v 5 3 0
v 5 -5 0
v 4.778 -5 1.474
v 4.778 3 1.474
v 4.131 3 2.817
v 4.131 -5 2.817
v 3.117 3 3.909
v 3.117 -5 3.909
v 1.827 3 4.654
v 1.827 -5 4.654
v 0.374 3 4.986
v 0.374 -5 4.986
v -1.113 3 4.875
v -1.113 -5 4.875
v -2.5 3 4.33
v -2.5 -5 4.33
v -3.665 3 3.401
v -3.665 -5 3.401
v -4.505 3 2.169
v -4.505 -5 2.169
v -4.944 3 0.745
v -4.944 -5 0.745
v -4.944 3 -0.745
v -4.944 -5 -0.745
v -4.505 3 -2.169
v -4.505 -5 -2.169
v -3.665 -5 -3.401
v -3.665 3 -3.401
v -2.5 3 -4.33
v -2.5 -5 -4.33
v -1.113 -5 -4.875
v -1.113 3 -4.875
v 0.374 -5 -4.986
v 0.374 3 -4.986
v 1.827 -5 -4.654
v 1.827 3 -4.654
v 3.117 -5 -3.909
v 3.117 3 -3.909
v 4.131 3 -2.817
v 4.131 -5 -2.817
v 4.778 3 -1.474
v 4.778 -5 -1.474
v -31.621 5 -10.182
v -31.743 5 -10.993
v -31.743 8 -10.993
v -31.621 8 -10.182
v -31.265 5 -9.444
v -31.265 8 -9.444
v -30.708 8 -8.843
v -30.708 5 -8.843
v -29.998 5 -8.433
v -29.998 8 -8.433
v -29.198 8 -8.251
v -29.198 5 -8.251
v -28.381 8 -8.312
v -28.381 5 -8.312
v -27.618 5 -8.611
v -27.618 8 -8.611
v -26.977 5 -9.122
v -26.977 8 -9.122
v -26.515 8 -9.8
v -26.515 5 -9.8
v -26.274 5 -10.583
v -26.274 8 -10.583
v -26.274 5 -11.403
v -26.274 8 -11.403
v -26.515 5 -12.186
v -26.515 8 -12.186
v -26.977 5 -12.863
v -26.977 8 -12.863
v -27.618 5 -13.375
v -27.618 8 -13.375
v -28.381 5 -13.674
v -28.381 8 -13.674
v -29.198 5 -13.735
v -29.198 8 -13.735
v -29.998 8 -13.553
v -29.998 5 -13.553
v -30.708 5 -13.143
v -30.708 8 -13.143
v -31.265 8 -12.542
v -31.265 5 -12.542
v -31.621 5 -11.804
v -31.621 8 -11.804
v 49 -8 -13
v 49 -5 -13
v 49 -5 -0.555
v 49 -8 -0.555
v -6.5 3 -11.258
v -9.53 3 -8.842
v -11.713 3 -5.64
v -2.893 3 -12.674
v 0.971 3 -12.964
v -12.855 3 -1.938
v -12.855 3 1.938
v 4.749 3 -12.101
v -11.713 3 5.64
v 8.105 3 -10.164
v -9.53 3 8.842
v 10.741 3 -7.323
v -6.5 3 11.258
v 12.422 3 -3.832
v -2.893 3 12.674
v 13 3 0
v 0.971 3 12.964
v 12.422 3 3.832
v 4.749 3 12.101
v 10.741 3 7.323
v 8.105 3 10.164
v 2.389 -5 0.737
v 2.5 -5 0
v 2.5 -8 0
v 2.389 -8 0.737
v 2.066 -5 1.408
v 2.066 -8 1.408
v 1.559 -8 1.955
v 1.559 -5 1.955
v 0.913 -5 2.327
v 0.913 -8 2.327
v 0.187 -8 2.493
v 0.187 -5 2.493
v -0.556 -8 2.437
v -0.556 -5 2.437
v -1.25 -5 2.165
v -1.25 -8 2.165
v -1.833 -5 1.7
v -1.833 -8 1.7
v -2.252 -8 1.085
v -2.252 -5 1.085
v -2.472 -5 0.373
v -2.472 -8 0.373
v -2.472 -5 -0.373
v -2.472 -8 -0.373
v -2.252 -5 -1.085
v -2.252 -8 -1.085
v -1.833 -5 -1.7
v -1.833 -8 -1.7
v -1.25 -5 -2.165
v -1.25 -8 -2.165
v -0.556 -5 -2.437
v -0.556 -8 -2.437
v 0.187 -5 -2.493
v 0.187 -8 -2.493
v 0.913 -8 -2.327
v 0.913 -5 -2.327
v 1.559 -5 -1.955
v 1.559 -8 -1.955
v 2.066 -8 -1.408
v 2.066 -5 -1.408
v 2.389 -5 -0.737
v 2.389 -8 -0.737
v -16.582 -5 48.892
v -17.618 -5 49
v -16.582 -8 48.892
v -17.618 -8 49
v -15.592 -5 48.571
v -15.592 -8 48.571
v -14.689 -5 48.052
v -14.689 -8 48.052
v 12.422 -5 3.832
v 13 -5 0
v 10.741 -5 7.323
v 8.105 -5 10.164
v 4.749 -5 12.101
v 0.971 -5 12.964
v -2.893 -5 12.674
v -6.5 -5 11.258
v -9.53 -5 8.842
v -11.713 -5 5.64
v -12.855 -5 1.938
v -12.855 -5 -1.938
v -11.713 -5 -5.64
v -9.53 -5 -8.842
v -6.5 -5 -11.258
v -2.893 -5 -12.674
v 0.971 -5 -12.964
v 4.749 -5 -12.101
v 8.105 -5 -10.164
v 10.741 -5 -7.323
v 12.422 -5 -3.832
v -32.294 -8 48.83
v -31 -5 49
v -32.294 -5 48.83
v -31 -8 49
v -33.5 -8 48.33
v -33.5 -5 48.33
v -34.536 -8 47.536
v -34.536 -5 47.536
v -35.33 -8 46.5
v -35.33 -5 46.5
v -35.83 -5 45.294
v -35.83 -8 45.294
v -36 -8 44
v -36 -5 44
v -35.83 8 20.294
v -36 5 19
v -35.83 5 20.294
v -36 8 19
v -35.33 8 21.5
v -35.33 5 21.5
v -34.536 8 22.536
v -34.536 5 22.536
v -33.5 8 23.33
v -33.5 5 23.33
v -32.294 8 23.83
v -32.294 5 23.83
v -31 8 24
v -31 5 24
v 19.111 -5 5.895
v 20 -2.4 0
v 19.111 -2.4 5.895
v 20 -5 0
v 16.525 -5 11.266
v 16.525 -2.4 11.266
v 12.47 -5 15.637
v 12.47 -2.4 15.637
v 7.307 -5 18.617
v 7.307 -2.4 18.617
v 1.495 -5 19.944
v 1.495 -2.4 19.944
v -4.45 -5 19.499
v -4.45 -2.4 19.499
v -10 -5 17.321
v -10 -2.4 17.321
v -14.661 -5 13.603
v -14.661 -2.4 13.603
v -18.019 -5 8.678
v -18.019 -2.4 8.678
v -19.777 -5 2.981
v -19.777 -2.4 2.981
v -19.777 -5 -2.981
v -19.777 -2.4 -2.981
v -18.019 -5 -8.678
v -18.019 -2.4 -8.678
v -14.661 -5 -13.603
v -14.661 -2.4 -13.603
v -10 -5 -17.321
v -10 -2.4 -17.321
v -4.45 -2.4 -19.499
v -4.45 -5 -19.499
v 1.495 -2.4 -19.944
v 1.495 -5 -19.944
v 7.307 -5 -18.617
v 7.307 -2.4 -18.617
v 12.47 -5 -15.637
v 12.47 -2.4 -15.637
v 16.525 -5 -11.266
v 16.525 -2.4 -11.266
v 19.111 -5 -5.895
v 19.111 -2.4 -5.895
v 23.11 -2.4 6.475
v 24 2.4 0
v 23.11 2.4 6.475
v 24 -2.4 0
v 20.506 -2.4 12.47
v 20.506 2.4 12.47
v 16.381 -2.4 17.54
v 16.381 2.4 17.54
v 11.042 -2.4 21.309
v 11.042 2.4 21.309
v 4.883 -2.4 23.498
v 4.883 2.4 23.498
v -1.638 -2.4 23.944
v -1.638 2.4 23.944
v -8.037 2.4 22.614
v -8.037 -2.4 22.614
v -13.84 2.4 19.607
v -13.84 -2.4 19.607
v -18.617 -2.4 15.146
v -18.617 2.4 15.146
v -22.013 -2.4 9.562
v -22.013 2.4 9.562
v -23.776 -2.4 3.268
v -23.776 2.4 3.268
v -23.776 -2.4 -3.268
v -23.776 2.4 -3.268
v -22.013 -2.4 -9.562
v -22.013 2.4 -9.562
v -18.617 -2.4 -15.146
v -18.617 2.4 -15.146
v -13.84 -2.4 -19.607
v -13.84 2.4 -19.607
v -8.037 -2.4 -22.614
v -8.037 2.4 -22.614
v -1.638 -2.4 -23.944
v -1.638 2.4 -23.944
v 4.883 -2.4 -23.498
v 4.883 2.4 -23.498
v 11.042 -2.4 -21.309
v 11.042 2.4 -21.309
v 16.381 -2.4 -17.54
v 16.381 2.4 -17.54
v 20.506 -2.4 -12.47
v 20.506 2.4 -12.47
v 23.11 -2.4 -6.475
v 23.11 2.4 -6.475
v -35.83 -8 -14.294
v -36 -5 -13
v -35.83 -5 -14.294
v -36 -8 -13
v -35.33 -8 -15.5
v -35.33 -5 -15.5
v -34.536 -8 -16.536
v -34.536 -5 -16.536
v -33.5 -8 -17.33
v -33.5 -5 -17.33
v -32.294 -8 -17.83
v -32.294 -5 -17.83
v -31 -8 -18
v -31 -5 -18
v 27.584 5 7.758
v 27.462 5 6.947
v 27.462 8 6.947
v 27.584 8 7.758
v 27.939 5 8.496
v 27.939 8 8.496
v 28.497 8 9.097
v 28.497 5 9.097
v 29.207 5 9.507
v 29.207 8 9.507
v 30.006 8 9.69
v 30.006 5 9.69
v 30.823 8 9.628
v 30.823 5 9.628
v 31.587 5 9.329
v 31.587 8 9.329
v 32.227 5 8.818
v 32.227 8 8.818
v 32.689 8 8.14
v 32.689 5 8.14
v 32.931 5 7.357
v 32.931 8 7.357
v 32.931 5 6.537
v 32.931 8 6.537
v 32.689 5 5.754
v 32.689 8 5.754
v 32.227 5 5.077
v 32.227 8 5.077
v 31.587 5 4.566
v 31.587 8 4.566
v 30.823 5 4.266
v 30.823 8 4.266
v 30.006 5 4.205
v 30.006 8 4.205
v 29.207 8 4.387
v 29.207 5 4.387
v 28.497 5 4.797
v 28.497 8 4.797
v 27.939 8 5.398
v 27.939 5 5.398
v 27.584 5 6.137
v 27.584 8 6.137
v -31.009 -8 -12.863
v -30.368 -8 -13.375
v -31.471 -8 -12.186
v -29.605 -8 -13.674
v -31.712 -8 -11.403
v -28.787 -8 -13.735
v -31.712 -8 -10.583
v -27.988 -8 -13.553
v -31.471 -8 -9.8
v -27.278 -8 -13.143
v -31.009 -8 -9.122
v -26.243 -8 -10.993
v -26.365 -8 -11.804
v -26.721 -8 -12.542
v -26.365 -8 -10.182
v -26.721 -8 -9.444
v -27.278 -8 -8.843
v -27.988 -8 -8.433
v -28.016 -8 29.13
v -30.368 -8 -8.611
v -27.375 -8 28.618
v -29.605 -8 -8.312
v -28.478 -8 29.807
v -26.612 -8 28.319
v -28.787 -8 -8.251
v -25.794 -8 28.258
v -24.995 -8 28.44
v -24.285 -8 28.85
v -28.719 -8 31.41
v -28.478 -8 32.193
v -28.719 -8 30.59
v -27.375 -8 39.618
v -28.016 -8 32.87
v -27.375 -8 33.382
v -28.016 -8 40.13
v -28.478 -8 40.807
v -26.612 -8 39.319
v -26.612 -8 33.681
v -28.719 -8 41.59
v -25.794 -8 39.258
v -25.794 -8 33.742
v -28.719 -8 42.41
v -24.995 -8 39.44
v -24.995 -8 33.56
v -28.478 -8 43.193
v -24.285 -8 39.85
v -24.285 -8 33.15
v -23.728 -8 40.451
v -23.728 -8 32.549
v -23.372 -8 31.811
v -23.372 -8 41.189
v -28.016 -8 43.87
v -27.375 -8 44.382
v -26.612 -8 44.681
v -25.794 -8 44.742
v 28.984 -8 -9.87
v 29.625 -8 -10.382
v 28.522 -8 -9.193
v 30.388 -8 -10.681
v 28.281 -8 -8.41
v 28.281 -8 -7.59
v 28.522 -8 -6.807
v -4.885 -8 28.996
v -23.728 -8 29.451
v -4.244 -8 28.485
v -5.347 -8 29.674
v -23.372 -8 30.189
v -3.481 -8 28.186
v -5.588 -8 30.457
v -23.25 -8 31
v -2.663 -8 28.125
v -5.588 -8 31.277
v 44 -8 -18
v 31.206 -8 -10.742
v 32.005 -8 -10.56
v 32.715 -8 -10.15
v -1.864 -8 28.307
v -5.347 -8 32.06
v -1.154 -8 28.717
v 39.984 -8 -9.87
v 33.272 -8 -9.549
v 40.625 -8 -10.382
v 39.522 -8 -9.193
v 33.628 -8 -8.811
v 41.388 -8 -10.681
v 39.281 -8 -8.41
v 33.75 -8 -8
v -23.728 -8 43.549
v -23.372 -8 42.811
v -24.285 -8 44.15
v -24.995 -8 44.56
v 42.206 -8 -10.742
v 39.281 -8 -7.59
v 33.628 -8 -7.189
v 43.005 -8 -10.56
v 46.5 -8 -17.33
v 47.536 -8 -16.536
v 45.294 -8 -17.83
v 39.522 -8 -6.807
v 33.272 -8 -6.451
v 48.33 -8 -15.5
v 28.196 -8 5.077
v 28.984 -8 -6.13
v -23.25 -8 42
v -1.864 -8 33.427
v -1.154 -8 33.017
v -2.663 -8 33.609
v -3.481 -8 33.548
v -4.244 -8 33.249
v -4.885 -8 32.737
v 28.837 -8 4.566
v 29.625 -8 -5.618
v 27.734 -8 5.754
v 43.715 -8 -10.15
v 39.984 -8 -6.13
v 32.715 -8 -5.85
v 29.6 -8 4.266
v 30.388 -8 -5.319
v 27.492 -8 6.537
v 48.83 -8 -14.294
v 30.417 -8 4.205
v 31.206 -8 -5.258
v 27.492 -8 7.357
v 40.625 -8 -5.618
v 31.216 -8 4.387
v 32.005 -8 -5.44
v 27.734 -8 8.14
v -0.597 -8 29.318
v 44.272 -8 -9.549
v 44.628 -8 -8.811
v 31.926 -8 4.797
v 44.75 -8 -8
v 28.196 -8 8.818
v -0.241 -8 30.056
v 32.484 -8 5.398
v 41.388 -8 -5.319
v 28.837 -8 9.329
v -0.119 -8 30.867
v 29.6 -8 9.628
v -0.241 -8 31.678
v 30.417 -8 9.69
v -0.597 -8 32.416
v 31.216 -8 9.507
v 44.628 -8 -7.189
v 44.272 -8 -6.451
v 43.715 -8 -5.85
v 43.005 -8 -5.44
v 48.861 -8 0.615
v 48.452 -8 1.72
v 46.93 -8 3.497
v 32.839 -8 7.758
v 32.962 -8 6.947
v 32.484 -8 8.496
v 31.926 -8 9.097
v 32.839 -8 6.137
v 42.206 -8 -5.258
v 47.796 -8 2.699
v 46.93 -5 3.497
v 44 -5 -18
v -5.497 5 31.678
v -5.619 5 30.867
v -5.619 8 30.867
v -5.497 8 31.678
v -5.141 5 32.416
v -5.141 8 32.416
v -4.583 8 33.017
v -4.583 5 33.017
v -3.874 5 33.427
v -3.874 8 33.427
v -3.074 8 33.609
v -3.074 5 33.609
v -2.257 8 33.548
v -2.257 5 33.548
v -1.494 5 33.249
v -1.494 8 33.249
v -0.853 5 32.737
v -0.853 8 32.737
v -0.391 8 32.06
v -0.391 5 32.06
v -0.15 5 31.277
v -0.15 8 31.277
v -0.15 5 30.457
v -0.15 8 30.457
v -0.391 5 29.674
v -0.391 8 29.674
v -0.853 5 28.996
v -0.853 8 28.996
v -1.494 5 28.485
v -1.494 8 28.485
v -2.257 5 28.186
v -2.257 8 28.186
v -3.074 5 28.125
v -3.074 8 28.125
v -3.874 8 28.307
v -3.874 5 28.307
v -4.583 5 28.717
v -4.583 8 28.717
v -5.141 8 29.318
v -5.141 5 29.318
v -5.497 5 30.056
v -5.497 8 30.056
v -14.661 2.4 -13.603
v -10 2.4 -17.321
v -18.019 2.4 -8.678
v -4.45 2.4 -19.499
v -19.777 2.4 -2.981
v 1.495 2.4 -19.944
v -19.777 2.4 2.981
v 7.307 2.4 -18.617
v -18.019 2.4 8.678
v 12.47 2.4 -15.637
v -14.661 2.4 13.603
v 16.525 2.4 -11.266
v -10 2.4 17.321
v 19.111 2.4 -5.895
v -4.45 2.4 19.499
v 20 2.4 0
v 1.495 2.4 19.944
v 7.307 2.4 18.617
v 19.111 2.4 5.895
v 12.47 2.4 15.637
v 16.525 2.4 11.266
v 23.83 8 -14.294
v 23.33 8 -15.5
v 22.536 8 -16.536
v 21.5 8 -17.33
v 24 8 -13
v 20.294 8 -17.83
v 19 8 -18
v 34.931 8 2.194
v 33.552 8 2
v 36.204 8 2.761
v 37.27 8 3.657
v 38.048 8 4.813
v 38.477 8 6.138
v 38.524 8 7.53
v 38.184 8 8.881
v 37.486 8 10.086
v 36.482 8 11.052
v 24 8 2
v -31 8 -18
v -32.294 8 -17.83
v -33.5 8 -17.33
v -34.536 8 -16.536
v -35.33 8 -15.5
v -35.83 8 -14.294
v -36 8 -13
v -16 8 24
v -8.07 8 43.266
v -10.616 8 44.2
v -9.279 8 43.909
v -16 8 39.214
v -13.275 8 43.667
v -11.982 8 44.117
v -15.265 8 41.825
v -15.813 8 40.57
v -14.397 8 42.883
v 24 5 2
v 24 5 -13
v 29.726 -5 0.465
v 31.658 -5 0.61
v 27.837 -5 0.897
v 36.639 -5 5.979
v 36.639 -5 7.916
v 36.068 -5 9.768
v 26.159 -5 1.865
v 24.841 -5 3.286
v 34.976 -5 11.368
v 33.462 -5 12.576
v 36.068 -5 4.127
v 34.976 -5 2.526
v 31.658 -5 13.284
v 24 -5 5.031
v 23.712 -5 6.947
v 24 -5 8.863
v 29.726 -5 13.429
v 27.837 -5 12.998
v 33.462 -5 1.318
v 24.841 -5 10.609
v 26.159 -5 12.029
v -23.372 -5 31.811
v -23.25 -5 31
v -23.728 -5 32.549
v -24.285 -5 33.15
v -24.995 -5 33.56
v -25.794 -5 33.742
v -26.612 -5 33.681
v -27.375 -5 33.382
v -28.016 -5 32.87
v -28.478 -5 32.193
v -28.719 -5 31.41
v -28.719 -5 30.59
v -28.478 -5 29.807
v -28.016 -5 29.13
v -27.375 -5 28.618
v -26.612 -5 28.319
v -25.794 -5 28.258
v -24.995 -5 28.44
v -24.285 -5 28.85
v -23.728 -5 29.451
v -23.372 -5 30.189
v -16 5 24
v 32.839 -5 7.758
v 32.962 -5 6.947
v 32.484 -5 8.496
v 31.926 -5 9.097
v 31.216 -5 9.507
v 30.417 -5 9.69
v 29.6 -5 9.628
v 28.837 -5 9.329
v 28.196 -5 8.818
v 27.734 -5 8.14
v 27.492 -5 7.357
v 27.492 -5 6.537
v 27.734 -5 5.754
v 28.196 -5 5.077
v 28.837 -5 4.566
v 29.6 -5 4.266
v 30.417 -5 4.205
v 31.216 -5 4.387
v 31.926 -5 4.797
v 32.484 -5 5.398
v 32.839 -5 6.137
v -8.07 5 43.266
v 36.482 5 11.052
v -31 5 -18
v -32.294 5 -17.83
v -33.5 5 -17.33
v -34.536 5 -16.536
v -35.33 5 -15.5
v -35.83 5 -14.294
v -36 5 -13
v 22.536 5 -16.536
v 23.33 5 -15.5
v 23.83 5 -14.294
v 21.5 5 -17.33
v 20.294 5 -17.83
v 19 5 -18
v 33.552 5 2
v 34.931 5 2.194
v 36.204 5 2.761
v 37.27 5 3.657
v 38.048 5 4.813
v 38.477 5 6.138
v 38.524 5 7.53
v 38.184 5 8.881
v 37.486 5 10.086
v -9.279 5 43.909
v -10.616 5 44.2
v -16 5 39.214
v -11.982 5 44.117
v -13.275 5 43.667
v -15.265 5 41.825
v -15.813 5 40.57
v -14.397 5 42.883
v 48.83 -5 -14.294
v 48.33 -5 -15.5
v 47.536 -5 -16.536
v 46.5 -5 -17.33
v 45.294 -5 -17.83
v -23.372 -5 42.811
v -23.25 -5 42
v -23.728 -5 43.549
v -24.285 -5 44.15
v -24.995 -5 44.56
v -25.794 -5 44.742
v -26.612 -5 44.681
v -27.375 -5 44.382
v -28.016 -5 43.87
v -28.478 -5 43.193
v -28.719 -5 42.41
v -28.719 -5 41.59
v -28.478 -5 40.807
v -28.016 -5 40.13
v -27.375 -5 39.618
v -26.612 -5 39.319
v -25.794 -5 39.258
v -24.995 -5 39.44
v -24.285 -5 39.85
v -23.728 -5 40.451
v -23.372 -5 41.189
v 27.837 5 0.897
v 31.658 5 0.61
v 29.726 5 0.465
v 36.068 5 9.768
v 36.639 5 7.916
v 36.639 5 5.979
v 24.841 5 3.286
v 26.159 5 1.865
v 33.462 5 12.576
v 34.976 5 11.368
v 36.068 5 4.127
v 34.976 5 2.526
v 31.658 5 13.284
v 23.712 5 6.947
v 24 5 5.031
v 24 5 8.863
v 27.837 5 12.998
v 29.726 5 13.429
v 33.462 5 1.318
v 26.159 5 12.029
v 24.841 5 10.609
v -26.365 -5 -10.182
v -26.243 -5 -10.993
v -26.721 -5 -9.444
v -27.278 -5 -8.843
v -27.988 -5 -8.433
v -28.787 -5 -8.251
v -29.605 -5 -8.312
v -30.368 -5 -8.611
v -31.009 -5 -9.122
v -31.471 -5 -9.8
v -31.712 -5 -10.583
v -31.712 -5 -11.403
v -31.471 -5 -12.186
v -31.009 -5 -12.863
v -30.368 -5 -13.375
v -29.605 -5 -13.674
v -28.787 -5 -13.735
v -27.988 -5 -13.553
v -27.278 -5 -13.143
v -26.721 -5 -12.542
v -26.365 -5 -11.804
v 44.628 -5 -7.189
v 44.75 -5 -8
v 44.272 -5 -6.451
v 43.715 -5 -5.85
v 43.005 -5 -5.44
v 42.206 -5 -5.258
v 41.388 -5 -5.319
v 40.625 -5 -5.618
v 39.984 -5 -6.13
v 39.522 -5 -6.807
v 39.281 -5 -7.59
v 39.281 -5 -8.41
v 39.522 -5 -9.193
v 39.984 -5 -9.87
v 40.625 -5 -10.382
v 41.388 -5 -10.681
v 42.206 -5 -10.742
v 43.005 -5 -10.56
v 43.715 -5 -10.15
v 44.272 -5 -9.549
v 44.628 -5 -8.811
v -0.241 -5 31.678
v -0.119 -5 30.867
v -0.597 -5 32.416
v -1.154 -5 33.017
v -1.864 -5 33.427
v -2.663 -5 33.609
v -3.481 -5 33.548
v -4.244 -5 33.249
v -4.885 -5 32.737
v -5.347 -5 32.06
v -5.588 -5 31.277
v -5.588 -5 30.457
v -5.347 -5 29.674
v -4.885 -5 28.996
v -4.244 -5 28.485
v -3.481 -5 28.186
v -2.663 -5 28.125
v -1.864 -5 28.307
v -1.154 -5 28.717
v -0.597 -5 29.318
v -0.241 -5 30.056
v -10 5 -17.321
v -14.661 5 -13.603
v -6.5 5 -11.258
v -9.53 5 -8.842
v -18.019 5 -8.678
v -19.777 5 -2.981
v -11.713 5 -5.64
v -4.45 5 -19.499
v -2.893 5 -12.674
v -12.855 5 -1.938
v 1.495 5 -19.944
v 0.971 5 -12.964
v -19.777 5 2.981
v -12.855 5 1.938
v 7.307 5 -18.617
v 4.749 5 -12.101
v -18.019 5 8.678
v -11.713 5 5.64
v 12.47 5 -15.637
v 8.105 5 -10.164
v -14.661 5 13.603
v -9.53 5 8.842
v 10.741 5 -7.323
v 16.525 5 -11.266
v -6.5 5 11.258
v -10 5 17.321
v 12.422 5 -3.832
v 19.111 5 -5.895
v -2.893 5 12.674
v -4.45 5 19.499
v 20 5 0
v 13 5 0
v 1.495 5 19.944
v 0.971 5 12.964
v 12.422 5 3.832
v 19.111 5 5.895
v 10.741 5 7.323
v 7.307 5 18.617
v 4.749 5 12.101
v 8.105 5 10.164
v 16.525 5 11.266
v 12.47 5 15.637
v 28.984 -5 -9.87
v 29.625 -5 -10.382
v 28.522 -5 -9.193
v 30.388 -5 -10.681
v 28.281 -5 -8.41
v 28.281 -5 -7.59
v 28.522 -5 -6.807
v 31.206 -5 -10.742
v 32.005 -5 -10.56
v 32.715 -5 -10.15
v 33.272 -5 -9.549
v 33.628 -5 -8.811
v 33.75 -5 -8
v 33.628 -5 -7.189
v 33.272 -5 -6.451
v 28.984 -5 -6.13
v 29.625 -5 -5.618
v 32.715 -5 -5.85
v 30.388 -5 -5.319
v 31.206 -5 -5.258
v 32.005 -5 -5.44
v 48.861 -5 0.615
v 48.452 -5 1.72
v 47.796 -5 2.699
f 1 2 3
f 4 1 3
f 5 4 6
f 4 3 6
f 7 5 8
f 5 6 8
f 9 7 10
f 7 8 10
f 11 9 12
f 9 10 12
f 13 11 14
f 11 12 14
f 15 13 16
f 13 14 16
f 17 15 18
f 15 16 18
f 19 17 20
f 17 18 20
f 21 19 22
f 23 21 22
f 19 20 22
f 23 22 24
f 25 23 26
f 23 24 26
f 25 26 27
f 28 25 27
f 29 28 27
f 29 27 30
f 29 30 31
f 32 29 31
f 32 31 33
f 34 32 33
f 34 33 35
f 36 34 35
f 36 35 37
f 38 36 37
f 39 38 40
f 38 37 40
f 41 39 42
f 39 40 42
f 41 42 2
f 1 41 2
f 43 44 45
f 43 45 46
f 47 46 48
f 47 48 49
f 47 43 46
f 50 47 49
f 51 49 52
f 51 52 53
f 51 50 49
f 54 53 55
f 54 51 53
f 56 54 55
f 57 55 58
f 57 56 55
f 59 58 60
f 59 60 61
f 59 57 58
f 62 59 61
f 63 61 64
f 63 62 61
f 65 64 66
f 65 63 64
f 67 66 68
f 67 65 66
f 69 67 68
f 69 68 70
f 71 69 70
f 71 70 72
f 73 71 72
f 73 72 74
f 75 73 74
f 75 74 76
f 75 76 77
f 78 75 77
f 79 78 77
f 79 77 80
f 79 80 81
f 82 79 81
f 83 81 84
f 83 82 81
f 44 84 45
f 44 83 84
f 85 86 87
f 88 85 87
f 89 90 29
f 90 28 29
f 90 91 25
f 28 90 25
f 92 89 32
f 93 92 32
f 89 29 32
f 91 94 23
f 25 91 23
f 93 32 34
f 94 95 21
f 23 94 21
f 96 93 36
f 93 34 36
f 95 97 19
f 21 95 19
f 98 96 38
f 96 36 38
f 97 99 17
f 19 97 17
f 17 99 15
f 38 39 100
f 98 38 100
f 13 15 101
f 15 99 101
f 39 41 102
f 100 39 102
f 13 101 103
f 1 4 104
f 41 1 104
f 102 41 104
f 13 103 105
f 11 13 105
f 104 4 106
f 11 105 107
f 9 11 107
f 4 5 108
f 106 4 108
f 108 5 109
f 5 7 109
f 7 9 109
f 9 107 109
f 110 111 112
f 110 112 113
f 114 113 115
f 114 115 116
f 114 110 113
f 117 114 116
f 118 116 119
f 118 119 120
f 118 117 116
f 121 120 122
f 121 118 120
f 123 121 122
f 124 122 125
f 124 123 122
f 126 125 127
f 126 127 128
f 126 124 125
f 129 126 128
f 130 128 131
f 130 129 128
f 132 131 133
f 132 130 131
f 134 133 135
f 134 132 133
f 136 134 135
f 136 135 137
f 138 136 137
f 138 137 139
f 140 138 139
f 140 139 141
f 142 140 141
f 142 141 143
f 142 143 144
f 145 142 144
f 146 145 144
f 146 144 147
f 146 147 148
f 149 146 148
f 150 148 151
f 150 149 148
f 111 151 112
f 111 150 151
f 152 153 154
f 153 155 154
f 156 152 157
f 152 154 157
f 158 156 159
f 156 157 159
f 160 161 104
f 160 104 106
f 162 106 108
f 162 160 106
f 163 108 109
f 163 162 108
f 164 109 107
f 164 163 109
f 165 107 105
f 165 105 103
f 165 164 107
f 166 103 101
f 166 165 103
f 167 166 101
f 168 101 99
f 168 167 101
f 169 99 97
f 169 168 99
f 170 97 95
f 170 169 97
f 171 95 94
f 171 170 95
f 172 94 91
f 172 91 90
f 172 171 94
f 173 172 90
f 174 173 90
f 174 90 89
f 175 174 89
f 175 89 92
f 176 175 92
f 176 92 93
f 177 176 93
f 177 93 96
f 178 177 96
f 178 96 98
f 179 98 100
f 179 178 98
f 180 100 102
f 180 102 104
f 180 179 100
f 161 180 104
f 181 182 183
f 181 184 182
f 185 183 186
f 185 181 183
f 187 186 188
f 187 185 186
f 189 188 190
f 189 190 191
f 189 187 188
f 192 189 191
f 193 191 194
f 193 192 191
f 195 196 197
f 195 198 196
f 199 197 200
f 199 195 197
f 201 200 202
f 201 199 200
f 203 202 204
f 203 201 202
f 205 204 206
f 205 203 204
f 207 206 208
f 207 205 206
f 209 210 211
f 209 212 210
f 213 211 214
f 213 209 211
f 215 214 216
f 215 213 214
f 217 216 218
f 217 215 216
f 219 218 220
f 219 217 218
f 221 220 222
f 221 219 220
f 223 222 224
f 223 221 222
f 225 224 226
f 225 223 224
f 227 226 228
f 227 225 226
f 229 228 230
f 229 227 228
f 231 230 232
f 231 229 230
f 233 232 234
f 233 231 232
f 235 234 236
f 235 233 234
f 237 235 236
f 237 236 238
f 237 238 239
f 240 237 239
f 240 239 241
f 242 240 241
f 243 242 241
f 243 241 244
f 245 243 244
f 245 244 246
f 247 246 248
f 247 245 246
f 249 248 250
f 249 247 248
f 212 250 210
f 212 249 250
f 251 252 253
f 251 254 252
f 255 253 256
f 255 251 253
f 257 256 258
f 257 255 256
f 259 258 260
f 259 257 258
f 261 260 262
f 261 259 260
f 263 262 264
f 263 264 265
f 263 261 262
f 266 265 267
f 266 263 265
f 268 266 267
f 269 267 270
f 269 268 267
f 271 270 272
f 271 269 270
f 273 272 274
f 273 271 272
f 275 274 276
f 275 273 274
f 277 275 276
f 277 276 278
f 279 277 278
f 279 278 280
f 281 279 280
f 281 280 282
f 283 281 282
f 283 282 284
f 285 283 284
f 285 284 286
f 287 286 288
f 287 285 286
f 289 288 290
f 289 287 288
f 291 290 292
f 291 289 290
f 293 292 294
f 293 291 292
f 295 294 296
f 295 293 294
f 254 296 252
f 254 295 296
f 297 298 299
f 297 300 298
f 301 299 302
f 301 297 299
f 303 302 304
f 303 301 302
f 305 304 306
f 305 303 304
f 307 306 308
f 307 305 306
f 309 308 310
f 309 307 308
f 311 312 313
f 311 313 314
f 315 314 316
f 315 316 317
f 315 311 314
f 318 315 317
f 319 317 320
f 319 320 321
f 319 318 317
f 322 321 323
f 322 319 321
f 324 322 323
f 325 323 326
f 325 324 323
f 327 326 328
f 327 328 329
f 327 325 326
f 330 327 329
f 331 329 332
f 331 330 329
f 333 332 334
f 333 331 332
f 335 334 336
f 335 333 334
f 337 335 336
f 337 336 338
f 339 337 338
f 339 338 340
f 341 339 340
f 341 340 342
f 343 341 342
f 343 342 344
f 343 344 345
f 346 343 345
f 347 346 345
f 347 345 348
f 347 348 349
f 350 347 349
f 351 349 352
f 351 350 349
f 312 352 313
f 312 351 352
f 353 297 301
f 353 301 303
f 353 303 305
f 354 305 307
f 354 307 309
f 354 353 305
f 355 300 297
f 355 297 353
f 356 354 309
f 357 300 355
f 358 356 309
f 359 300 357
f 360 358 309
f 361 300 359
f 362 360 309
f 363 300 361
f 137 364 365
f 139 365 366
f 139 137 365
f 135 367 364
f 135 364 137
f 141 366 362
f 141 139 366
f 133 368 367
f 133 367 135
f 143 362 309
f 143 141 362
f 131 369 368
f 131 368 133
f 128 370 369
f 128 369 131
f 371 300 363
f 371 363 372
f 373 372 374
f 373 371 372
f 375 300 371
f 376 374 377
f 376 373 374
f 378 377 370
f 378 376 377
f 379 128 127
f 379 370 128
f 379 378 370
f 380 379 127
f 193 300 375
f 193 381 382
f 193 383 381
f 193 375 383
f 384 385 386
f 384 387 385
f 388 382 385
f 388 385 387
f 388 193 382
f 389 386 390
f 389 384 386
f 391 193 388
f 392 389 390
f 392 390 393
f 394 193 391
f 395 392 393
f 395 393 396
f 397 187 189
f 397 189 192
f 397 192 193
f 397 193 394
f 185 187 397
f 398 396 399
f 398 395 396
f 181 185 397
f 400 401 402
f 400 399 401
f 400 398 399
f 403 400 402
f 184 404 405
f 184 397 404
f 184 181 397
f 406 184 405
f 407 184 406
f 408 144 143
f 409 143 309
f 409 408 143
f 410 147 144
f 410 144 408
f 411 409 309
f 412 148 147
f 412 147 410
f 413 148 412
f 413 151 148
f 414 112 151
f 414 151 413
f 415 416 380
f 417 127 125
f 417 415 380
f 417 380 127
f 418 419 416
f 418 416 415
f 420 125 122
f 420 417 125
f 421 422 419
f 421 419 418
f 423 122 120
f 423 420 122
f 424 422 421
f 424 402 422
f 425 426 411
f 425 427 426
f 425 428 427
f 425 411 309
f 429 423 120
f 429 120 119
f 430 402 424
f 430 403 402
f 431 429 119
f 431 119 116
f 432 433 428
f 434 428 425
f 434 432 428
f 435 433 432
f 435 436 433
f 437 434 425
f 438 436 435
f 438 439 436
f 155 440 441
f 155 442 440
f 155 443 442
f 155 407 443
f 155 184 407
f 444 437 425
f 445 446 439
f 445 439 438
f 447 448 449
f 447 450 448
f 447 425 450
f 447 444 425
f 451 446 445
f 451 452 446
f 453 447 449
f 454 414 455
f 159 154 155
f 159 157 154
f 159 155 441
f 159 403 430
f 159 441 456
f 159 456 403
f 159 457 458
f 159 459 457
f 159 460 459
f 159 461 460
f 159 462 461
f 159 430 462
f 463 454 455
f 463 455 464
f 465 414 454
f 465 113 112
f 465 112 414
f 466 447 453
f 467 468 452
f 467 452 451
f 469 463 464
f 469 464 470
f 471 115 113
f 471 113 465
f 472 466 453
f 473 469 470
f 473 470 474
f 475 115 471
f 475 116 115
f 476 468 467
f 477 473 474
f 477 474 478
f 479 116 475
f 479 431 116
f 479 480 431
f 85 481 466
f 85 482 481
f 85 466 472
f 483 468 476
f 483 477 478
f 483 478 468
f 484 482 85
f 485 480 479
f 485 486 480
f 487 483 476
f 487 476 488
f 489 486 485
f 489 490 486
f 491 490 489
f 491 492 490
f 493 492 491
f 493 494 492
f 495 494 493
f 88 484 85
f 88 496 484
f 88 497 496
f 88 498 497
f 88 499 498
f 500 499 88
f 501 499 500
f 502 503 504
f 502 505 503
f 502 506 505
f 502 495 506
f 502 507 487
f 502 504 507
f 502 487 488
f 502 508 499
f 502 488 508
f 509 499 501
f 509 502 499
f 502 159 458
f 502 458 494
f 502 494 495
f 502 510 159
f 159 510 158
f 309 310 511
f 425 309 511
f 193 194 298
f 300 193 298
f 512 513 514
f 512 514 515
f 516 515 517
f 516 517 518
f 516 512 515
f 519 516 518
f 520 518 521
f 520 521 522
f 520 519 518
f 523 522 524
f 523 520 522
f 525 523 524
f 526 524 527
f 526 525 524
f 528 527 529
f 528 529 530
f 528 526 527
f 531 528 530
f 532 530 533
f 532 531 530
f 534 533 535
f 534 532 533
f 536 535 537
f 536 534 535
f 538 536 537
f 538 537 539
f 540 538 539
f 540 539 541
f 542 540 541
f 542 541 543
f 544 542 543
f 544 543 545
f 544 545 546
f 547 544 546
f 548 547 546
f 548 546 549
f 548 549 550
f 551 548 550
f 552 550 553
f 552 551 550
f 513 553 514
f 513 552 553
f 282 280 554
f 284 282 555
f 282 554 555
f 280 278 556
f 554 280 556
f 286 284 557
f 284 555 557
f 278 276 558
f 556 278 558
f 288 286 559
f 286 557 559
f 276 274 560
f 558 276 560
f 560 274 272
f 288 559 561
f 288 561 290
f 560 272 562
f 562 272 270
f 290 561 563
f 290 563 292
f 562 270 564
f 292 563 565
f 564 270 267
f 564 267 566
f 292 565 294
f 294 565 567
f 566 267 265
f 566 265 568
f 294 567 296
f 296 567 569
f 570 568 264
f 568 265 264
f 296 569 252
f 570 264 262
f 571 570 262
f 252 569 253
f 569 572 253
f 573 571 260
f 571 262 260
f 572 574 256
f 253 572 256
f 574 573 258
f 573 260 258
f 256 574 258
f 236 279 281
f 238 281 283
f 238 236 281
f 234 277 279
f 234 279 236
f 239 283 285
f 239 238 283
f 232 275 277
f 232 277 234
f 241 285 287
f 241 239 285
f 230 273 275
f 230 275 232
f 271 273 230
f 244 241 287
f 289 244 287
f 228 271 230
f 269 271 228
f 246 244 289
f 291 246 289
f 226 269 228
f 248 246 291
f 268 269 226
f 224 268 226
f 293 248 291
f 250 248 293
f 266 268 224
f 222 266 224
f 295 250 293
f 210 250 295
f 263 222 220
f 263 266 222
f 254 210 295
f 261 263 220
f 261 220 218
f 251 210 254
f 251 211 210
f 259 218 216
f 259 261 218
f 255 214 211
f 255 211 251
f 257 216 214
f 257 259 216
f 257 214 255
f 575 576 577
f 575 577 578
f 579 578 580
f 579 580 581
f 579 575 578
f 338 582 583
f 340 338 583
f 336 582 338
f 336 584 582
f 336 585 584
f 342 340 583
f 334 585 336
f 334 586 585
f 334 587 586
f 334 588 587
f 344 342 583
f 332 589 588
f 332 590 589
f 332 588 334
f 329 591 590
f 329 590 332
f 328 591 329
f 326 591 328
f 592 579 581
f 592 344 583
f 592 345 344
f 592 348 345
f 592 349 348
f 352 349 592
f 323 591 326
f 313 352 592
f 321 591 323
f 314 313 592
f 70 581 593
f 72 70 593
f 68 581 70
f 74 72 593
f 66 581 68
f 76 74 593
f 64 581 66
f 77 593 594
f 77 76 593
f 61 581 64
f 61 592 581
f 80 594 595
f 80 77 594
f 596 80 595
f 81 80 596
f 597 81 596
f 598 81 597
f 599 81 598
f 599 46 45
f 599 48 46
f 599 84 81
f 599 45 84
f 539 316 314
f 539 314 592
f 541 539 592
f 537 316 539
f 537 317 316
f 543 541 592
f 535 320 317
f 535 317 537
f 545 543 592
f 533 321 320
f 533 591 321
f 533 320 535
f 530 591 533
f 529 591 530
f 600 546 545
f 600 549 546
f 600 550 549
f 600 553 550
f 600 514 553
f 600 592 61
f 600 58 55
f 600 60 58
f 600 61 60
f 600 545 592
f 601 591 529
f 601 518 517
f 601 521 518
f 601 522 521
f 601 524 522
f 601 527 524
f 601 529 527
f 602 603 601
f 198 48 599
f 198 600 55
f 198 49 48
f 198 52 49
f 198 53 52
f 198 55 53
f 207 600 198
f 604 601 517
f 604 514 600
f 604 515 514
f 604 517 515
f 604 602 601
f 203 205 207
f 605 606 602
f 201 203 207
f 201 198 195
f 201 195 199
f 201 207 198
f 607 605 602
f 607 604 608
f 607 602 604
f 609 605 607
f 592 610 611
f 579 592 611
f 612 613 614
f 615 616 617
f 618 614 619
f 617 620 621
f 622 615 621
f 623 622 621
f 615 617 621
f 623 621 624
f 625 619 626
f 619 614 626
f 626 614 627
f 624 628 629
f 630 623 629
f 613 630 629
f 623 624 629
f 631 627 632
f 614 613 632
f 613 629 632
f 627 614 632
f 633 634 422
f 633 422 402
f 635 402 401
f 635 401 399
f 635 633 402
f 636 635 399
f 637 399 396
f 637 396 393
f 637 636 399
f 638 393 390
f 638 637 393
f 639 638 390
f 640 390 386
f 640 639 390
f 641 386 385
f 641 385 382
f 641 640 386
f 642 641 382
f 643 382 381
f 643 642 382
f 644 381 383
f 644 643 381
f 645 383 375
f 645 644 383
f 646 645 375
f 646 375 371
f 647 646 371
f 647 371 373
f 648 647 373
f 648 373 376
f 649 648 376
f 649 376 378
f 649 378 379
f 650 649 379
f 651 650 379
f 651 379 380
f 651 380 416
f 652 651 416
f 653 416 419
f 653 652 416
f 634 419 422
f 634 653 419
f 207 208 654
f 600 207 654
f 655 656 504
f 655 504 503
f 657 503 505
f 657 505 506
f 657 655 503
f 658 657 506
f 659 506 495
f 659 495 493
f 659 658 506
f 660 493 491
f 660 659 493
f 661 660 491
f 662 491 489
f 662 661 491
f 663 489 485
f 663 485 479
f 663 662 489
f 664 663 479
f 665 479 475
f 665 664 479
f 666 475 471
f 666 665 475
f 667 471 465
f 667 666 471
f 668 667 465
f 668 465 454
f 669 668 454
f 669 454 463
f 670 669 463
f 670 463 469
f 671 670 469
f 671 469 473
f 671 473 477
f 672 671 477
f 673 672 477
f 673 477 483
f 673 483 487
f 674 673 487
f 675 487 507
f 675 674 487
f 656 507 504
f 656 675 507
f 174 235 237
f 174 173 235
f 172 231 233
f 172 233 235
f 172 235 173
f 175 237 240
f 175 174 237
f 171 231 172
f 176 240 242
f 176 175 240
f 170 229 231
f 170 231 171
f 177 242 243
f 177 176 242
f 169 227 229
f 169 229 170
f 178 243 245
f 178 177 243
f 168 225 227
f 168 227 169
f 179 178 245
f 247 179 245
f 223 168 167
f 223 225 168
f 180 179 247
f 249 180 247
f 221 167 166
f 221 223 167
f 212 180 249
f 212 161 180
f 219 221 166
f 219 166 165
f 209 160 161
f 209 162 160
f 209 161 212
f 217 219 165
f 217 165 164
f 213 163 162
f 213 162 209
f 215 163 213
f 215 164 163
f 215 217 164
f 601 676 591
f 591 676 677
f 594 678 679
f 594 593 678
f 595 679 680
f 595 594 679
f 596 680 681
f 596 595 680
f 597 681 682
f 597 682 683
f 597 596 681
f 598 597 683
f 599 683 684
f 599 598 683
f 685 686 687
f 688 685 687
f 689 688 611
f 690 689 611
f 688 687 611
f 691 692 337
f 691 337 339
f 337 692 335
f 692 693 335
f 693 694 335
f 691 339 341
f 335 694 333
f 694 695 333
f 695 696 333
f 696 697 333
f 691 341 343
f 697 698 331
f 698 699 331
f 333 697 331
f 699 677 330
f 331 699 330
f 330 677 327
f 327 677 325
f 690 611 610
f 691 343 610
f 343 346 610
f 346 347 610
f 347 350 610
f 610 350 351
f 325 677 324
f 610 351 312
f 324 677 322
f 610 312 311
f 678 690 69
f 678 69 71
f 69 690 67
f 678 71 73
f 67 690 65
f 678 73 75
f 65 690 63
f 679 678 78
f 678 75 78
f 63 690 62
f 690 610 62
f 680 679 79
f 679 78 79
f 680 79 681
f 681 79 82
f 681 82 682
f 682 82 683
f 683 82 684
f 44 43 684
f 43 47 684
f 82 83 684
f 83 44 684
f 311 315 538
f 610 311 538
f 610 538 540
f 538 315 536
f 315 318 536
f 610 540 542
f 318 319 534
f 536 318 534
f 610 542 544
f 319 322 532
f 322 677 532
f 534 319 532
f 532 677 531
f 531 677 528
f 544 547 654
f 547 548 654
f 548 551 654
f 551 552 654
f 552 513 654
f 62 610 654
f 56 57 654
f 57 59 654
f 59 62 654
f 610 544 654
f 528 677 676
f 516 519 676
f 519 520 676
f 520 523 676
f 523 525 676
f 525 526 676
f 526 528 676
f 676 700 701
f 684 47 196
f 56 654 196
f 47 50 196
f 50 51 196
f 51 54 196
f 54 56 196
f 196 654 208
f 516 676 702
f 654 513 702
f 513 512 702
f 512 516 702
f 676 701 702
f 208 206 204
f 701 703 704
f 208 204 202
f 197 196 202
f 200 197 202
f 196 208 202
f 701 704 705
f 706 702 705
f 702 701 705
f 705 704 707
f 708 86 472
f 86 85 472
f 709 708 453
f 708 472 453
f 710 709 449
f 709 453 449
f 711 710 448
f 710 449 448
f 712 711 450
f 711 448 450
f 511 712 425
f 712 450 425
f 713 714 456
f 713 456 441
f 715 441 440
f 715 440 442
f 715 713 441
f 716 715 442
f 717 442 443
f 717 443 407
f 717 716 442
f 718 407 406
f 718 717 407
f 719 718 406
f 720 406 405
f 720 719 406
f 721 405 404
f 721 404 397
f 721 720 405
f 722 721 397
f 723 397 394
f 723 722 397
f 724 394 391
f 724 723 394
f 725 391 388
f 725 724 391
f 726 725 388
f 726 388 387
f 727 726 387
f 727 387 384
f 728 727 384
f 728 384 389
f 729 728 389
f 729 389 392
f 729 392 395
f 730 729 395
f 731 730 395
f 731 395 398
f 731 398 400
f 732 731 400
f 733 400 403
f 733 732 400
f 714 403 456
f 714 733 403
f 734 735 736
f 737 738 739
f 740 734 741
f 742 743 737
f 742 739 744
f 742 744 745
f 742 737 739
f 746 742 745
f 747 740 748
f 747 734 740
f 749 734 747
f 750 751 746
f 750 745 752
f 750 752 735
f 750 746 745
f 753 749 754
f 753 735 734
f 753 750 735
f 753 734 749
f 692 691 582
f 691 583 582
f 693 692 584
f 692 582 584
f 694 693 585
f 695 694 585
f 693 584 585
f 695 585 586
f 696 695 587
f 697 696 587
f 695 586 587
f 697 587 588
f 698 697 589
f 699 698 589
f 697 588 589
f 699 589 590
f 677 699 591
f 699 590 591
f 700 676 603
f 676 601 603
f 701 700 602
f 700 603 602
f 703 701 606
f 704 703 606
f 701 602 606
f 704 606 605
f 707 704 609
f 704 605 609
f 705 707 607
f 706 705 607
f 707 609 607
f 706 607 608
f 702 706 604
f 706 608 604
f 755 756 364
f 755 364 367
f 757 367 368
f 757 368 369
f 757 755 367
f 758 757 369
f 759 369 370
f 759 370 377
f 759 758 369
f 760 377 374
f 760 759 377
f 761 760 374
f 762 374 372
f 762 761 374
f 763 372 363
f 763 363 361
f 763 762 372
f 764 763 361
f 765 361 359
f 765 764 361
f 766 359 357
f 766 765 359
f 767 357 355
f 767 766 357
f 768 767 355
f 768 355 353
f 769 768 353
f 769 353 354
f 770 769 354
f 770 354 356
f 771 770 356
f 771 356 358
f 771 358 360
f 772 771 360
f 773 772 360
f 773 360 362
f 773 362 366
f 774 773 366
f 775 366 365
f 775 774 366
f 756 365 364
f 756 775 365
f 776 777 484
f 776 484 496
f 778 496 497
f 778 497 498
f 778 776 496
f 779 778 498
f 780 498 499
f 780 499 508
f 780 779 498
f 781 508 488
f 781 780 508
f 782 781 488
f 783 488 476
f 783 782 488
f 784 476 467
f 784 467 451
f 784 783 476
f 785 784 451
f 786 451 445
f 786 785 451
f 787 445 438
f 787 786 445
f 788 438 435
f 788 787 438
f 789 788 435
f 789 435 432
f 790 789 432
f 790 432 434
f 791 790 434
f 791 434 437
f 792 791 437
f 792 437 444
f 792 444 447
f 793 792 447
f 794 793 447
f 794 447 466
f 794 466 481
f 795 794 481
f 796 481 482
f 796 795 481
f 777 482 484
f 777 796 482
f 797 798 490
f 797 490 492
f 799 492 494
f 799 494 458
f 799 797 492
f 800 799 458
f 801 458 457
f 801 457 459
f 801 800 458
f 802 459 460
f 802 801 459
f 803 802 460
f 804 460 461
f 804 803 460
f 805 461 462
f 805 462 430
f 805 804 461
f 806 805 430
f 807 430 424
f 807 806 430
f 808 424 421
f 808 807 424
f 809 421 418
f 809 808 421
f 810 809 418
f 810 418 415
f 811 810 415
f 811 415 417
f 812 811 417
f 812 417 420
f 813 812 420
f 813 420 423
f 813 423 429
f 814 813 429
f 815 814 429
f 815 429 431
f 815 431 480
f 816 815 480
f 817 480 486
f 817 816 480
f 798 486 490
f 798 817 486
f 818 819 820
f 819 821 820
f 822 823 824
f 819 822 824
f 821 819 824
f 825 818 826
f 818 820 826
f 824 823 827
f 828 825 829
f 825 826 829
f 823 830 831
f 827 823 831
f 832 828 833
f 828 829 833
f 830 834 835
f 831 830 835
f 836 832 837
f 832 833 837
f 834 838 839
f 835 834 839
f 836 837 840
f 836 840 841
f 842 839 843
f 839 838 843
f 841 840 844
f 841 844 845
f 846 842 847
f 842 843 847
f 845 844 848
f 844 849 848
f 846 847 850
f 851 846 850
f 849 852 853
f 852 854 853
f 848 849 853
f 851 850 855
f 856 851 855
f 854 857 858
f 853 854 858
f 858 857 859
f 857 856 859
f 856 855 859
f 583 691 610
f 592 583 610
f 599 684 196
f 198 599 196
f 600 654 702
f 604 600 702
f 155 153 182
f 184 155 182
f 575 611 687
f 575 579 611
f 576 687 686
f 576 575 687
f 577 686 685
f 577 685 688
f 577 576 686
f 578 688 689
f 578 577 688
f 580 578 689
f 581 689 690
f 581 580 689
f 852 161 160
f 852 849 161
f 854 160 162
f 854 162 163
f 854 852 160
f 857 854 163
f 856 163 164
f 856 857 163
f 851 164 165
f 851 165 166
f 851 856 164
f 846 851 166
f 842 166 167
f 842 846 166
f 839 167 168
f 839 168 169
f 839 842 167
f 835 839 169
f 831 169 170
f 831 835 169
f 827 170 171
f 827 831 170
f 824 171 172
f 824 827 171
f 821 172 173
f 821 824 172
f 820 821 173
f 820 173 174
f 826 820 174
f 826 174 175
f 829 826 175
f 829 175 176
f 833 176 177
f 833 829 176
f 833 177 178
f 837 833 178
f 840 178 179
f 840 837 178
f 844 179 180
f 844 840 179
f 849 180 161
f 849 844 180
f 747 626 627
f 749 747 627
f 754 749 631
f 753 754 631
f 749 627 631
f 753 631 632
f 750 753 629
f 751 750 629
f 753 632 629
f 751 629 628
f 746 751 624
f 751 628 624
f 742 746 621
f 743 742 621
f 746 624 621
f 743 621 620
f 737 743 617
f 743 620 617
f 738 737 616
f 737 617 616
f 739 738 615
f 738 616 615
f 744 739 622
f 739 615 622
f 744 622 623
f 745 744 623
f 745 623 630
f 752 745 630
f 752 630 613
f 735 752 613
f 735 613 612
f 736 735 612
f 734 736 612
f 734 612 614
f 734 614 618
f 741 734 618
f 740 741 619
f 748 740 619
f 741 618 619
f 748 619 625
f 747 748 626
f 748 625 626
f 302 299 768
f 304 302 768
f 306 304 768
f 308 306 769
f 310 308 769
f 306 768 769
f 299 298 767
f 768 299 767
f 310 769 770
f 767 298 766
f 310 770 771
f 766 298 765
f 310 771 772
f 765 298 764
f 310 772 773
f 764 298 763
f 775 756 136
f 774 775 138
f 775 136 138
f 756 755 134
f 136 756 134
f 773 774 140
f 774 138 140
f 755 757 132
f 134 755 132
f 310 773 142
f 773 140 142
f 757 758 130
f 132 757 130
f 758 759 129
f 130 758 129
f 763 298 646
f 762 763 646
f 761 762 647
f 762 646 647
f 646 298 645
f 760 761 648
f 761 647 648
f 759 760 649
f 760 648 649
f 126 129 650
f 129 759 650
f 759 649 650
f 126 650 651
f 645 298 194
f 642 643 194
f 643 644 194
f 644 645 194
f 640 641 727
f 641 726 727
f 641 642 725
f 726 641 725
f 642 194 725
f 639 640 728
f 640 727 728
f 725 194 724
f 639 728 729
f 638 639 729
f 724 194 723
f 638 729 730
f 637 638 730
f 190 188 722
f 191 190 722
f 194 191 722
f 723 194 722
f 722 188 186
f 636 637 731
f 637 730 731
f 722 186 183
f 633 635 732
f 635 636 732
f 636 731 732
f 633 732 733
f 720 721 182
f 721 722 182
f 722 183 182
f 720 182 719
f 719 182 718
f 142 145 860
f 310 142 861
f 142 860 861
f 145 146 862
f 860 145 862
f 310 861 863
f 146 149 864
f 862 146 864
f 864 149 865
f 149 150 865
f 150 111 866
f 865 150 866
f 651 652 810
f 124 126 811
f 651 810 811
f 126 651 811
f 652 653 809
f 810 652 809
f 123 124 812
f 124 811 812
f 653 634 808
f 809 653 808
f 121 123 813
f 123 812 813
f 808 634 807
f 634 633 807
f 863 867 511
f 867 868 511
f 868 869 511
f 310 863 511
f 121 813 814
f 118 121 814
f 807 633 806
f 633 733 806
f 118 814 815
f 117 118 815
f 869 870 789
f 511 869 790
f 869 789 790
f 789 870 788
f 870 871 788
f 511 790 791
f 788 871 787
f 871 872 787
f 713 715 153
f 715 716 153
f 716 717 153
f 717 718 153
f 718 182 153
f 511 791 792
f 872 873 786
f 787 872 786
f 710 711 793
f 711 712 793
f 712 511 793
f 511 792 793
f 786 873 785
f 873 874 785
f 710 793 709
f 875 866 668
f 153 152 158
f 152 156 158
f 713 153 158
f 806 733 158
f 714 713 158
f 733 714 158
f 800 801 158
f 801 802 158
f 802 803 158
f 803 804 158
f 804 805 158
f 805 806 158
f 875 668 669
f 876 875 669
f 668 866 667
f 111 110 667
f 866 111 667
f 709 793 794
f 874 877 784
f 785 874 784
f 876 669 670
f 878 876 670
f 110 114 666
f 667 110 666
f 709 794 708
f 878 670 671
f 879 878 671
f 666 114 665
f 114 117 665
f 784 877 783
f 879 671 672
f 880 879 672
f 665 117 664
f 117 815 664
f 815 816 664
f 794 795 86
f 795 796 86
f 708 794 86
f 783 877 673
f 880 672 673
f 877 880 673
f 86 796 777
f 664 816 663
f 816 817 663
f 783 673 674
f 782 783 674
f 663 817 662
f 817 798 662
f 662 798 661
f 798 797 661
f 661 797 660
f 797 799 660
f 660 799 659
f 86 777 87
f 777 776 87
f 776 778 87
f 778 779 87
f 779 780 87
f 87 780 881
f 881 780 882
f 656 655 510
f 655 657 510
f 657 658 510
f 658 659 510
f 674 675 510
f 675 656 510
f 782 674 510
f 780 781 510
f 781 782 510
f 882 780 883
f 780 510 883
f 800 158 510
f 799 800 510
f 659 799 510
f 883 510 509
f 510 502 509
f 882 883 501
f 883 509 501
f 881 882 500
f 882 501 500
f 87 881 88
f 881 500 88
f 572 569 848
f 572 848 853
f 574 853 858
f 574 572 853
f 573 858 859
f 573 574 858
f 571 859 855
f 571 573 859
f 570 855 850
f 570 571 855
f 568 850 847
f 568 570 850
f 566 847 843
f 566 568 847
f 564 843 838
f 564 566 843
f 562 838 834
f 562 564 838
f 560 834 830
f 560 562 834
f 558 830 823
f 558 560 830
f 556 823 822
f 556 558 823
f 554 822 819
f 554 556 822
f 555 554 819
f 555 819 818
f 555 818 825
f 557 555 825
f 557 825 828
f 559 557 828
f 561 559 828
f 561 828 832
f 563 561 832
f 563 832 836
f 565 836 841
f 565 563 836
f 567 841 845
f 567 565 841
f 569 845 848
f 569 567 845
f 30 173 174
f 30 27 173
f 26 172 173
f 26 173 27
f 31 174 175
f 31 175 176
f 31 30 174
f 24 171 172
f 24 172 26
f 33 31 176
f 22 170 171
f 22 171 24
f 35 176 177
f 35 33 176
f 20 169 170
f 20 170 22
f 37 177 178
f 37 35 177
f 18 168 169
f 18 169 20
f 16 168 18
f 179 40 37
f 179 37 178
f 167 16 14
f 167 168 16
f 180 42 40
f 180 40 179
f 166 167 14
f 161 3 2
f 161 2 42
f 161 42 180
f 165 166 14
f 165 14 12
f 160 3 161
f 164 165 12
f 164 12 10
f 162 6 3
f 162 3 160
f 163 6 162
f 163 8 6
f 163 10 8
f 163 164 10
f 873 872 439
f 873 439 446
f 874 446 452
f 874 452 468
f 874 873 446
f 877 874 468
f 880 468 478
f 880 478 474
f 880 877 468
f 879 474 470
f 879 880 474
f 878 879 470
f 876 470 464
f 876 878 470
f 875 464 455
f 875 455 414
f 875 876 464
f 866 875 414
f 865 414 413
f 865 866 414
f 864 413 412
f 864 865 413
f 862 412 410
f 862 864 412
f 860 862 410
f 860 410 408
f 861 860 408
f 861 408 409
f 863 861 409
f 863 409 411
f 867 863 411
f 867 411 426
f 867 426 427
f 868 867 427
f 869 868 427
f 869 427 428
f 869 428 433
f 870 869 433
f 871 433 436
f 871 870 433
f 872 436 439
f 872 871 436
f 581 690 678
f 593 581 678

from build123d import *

# Parameters (mm, degrees)
F0_R      = 20
F0_R_2    = 13
F1_DEPTH  = 5
F0_R_3    = 24
F2_DEPTH  = 2.4
F4_R      = 2.75
F4_R_2    = 2.5
F5_DEPTH  = 3
F6_R      = 13
F6_R_2    = 5
F7_DEPTH  = 8
F8_R      = 2.75
F9_DEPTH  = 3
F10_R     = 5
F10_2_R   = 5
F11_R     = 6.5
F12_DEPTH = 10


# Not quite as in the source:
# - a feature names something its author has since deleted; it is built from what else it names


with BuildPart() as f1:
    # F0 (on Front) → F1 (new body, symmetric)
    with BuildSketch(Plane.XZ):
        Circle(F0_R)
        Circle(F0_R_2, mode=Mode.SUBTRACT)
    extrude(amount=F1_DEPTH, both=True)

    # F0 (on Front) → F2 (join, symmetric)
    with BuildSketch(Plane.XZ):
        Circle(F0_R_3)
        Circle(F0_R, mode=Mode.SUBTRACT)
    extrude(amount=F2_DEPTH, both=True)


with BuildPart() as f5:
    # F4 (on offset) → F5 (new body)
    with BuildSketch(Plane.XZ.offset(5)):
        Polygon((-16, 49), (-36, 49), (-36, -18), (49, -18), (49, 2), align=None)
        with Locations((-28.9929573972, -10.9929573972)):
            Circle(F4_R, mode=Mode.SUBTRACT)
        Circle(F4_R_2, mode=Mode.SUBTRACT)
        with Locations((31, -8)):
            Circle(F4_R, mode=Mode.SUBTRACT)
        with Locations((42, -8)):
            Circle(F4_R, mode=Mode.SUBTRACT)
        with Locations((30.2115080133, 6.9472860574)):
            Circle(F4_R, mode=Mode.SUBTRACT)
        with Locations((-26, 31)):
            Circle(F4_R, mode=Mode.SUBTRACT)
        with Locations((-2.8688968517, 30.8669634213)):
            Circle(F4_R, mode=Mode.SUBTRACT)
        with Locations((-26, 42)):
            Circle(F4_R, mode=Mode.SUBTRACT)
    extrude(amount=F5_DEPTH)

    # F10#2
    f10_2_edges = [f5.edges().sort_by_distance(p)[0] for p in [
        (-36, -6.5, 49),
        (-36, -6.5, -18),
        (49, -6.5, -18),
        (49, -6.5, 2),
        (-16, -6.5, 49),
    ]]
    fillet(f10_2_edges, radius=F10_2_R)


with BuildPart() as f7:
    # F6 (on offset) → F7 (new body)
    with BuildSketch(Plane.XZ.offset(5)):
        Circle(F6_R)
        Circle(F6_R_2, mode=Mode.SUBTRACT)
    extrude(amount=-F7_DEPTH)


with BuildPart() as f9:
    # F8 (on face) → F9 (new body)
    with BuildSketch(Plane(origin=(0, 5, 0), x_dir=(-1, 0, 0), z_dir=(0, 1, 0))):
        Polygon((-24, 2), (-24, -18), (36, -18), (36, 24), (16, 24), (16, 49), (-49, 2), align=None)
        with Locations((-30.2115080133, 6.9472860574)):
            Circle(F8_R, mode=Mode.SUBTRACT)
        with Locations((28.9929573972, -10.9929573972)):
            Circle(F8_R, mode=Mode.SUBTRACT)
        with Locations((2.8688968517, 30.8669634213)):
            Circle(F8_R, mode=Mode.SUBTRACT)
    extrude(amount=F9_DEPTH)

    # F10
    f10_edges = [f9.edges().sort_by_distance(p)[0] for p in [
        (49, 6.5, 2),
        (-16, 6.5, 49),
        (-36, 6.5, -18),
        (-36, 6.5, 24),
        (24, 6.5, -18),
    ]]
    fillet(f10_edges, radius=F10_R)


with BuildPart() as f12:
    # F11 (on face) → F12 (new body, through all)
    with BuildSketch(Plane(origin=(0, -5, 0), x_dir=(-1, 0, 0), z_dir=(0, 1, 0))):
        with Locations((-30.2115080133, 6.9472860574)):
            Circle(F11_R)
    extrude(amount=F12_DEPTH)


solid = Compound([f1.part, f5.part, f7.part, f9.part, f12.part])
